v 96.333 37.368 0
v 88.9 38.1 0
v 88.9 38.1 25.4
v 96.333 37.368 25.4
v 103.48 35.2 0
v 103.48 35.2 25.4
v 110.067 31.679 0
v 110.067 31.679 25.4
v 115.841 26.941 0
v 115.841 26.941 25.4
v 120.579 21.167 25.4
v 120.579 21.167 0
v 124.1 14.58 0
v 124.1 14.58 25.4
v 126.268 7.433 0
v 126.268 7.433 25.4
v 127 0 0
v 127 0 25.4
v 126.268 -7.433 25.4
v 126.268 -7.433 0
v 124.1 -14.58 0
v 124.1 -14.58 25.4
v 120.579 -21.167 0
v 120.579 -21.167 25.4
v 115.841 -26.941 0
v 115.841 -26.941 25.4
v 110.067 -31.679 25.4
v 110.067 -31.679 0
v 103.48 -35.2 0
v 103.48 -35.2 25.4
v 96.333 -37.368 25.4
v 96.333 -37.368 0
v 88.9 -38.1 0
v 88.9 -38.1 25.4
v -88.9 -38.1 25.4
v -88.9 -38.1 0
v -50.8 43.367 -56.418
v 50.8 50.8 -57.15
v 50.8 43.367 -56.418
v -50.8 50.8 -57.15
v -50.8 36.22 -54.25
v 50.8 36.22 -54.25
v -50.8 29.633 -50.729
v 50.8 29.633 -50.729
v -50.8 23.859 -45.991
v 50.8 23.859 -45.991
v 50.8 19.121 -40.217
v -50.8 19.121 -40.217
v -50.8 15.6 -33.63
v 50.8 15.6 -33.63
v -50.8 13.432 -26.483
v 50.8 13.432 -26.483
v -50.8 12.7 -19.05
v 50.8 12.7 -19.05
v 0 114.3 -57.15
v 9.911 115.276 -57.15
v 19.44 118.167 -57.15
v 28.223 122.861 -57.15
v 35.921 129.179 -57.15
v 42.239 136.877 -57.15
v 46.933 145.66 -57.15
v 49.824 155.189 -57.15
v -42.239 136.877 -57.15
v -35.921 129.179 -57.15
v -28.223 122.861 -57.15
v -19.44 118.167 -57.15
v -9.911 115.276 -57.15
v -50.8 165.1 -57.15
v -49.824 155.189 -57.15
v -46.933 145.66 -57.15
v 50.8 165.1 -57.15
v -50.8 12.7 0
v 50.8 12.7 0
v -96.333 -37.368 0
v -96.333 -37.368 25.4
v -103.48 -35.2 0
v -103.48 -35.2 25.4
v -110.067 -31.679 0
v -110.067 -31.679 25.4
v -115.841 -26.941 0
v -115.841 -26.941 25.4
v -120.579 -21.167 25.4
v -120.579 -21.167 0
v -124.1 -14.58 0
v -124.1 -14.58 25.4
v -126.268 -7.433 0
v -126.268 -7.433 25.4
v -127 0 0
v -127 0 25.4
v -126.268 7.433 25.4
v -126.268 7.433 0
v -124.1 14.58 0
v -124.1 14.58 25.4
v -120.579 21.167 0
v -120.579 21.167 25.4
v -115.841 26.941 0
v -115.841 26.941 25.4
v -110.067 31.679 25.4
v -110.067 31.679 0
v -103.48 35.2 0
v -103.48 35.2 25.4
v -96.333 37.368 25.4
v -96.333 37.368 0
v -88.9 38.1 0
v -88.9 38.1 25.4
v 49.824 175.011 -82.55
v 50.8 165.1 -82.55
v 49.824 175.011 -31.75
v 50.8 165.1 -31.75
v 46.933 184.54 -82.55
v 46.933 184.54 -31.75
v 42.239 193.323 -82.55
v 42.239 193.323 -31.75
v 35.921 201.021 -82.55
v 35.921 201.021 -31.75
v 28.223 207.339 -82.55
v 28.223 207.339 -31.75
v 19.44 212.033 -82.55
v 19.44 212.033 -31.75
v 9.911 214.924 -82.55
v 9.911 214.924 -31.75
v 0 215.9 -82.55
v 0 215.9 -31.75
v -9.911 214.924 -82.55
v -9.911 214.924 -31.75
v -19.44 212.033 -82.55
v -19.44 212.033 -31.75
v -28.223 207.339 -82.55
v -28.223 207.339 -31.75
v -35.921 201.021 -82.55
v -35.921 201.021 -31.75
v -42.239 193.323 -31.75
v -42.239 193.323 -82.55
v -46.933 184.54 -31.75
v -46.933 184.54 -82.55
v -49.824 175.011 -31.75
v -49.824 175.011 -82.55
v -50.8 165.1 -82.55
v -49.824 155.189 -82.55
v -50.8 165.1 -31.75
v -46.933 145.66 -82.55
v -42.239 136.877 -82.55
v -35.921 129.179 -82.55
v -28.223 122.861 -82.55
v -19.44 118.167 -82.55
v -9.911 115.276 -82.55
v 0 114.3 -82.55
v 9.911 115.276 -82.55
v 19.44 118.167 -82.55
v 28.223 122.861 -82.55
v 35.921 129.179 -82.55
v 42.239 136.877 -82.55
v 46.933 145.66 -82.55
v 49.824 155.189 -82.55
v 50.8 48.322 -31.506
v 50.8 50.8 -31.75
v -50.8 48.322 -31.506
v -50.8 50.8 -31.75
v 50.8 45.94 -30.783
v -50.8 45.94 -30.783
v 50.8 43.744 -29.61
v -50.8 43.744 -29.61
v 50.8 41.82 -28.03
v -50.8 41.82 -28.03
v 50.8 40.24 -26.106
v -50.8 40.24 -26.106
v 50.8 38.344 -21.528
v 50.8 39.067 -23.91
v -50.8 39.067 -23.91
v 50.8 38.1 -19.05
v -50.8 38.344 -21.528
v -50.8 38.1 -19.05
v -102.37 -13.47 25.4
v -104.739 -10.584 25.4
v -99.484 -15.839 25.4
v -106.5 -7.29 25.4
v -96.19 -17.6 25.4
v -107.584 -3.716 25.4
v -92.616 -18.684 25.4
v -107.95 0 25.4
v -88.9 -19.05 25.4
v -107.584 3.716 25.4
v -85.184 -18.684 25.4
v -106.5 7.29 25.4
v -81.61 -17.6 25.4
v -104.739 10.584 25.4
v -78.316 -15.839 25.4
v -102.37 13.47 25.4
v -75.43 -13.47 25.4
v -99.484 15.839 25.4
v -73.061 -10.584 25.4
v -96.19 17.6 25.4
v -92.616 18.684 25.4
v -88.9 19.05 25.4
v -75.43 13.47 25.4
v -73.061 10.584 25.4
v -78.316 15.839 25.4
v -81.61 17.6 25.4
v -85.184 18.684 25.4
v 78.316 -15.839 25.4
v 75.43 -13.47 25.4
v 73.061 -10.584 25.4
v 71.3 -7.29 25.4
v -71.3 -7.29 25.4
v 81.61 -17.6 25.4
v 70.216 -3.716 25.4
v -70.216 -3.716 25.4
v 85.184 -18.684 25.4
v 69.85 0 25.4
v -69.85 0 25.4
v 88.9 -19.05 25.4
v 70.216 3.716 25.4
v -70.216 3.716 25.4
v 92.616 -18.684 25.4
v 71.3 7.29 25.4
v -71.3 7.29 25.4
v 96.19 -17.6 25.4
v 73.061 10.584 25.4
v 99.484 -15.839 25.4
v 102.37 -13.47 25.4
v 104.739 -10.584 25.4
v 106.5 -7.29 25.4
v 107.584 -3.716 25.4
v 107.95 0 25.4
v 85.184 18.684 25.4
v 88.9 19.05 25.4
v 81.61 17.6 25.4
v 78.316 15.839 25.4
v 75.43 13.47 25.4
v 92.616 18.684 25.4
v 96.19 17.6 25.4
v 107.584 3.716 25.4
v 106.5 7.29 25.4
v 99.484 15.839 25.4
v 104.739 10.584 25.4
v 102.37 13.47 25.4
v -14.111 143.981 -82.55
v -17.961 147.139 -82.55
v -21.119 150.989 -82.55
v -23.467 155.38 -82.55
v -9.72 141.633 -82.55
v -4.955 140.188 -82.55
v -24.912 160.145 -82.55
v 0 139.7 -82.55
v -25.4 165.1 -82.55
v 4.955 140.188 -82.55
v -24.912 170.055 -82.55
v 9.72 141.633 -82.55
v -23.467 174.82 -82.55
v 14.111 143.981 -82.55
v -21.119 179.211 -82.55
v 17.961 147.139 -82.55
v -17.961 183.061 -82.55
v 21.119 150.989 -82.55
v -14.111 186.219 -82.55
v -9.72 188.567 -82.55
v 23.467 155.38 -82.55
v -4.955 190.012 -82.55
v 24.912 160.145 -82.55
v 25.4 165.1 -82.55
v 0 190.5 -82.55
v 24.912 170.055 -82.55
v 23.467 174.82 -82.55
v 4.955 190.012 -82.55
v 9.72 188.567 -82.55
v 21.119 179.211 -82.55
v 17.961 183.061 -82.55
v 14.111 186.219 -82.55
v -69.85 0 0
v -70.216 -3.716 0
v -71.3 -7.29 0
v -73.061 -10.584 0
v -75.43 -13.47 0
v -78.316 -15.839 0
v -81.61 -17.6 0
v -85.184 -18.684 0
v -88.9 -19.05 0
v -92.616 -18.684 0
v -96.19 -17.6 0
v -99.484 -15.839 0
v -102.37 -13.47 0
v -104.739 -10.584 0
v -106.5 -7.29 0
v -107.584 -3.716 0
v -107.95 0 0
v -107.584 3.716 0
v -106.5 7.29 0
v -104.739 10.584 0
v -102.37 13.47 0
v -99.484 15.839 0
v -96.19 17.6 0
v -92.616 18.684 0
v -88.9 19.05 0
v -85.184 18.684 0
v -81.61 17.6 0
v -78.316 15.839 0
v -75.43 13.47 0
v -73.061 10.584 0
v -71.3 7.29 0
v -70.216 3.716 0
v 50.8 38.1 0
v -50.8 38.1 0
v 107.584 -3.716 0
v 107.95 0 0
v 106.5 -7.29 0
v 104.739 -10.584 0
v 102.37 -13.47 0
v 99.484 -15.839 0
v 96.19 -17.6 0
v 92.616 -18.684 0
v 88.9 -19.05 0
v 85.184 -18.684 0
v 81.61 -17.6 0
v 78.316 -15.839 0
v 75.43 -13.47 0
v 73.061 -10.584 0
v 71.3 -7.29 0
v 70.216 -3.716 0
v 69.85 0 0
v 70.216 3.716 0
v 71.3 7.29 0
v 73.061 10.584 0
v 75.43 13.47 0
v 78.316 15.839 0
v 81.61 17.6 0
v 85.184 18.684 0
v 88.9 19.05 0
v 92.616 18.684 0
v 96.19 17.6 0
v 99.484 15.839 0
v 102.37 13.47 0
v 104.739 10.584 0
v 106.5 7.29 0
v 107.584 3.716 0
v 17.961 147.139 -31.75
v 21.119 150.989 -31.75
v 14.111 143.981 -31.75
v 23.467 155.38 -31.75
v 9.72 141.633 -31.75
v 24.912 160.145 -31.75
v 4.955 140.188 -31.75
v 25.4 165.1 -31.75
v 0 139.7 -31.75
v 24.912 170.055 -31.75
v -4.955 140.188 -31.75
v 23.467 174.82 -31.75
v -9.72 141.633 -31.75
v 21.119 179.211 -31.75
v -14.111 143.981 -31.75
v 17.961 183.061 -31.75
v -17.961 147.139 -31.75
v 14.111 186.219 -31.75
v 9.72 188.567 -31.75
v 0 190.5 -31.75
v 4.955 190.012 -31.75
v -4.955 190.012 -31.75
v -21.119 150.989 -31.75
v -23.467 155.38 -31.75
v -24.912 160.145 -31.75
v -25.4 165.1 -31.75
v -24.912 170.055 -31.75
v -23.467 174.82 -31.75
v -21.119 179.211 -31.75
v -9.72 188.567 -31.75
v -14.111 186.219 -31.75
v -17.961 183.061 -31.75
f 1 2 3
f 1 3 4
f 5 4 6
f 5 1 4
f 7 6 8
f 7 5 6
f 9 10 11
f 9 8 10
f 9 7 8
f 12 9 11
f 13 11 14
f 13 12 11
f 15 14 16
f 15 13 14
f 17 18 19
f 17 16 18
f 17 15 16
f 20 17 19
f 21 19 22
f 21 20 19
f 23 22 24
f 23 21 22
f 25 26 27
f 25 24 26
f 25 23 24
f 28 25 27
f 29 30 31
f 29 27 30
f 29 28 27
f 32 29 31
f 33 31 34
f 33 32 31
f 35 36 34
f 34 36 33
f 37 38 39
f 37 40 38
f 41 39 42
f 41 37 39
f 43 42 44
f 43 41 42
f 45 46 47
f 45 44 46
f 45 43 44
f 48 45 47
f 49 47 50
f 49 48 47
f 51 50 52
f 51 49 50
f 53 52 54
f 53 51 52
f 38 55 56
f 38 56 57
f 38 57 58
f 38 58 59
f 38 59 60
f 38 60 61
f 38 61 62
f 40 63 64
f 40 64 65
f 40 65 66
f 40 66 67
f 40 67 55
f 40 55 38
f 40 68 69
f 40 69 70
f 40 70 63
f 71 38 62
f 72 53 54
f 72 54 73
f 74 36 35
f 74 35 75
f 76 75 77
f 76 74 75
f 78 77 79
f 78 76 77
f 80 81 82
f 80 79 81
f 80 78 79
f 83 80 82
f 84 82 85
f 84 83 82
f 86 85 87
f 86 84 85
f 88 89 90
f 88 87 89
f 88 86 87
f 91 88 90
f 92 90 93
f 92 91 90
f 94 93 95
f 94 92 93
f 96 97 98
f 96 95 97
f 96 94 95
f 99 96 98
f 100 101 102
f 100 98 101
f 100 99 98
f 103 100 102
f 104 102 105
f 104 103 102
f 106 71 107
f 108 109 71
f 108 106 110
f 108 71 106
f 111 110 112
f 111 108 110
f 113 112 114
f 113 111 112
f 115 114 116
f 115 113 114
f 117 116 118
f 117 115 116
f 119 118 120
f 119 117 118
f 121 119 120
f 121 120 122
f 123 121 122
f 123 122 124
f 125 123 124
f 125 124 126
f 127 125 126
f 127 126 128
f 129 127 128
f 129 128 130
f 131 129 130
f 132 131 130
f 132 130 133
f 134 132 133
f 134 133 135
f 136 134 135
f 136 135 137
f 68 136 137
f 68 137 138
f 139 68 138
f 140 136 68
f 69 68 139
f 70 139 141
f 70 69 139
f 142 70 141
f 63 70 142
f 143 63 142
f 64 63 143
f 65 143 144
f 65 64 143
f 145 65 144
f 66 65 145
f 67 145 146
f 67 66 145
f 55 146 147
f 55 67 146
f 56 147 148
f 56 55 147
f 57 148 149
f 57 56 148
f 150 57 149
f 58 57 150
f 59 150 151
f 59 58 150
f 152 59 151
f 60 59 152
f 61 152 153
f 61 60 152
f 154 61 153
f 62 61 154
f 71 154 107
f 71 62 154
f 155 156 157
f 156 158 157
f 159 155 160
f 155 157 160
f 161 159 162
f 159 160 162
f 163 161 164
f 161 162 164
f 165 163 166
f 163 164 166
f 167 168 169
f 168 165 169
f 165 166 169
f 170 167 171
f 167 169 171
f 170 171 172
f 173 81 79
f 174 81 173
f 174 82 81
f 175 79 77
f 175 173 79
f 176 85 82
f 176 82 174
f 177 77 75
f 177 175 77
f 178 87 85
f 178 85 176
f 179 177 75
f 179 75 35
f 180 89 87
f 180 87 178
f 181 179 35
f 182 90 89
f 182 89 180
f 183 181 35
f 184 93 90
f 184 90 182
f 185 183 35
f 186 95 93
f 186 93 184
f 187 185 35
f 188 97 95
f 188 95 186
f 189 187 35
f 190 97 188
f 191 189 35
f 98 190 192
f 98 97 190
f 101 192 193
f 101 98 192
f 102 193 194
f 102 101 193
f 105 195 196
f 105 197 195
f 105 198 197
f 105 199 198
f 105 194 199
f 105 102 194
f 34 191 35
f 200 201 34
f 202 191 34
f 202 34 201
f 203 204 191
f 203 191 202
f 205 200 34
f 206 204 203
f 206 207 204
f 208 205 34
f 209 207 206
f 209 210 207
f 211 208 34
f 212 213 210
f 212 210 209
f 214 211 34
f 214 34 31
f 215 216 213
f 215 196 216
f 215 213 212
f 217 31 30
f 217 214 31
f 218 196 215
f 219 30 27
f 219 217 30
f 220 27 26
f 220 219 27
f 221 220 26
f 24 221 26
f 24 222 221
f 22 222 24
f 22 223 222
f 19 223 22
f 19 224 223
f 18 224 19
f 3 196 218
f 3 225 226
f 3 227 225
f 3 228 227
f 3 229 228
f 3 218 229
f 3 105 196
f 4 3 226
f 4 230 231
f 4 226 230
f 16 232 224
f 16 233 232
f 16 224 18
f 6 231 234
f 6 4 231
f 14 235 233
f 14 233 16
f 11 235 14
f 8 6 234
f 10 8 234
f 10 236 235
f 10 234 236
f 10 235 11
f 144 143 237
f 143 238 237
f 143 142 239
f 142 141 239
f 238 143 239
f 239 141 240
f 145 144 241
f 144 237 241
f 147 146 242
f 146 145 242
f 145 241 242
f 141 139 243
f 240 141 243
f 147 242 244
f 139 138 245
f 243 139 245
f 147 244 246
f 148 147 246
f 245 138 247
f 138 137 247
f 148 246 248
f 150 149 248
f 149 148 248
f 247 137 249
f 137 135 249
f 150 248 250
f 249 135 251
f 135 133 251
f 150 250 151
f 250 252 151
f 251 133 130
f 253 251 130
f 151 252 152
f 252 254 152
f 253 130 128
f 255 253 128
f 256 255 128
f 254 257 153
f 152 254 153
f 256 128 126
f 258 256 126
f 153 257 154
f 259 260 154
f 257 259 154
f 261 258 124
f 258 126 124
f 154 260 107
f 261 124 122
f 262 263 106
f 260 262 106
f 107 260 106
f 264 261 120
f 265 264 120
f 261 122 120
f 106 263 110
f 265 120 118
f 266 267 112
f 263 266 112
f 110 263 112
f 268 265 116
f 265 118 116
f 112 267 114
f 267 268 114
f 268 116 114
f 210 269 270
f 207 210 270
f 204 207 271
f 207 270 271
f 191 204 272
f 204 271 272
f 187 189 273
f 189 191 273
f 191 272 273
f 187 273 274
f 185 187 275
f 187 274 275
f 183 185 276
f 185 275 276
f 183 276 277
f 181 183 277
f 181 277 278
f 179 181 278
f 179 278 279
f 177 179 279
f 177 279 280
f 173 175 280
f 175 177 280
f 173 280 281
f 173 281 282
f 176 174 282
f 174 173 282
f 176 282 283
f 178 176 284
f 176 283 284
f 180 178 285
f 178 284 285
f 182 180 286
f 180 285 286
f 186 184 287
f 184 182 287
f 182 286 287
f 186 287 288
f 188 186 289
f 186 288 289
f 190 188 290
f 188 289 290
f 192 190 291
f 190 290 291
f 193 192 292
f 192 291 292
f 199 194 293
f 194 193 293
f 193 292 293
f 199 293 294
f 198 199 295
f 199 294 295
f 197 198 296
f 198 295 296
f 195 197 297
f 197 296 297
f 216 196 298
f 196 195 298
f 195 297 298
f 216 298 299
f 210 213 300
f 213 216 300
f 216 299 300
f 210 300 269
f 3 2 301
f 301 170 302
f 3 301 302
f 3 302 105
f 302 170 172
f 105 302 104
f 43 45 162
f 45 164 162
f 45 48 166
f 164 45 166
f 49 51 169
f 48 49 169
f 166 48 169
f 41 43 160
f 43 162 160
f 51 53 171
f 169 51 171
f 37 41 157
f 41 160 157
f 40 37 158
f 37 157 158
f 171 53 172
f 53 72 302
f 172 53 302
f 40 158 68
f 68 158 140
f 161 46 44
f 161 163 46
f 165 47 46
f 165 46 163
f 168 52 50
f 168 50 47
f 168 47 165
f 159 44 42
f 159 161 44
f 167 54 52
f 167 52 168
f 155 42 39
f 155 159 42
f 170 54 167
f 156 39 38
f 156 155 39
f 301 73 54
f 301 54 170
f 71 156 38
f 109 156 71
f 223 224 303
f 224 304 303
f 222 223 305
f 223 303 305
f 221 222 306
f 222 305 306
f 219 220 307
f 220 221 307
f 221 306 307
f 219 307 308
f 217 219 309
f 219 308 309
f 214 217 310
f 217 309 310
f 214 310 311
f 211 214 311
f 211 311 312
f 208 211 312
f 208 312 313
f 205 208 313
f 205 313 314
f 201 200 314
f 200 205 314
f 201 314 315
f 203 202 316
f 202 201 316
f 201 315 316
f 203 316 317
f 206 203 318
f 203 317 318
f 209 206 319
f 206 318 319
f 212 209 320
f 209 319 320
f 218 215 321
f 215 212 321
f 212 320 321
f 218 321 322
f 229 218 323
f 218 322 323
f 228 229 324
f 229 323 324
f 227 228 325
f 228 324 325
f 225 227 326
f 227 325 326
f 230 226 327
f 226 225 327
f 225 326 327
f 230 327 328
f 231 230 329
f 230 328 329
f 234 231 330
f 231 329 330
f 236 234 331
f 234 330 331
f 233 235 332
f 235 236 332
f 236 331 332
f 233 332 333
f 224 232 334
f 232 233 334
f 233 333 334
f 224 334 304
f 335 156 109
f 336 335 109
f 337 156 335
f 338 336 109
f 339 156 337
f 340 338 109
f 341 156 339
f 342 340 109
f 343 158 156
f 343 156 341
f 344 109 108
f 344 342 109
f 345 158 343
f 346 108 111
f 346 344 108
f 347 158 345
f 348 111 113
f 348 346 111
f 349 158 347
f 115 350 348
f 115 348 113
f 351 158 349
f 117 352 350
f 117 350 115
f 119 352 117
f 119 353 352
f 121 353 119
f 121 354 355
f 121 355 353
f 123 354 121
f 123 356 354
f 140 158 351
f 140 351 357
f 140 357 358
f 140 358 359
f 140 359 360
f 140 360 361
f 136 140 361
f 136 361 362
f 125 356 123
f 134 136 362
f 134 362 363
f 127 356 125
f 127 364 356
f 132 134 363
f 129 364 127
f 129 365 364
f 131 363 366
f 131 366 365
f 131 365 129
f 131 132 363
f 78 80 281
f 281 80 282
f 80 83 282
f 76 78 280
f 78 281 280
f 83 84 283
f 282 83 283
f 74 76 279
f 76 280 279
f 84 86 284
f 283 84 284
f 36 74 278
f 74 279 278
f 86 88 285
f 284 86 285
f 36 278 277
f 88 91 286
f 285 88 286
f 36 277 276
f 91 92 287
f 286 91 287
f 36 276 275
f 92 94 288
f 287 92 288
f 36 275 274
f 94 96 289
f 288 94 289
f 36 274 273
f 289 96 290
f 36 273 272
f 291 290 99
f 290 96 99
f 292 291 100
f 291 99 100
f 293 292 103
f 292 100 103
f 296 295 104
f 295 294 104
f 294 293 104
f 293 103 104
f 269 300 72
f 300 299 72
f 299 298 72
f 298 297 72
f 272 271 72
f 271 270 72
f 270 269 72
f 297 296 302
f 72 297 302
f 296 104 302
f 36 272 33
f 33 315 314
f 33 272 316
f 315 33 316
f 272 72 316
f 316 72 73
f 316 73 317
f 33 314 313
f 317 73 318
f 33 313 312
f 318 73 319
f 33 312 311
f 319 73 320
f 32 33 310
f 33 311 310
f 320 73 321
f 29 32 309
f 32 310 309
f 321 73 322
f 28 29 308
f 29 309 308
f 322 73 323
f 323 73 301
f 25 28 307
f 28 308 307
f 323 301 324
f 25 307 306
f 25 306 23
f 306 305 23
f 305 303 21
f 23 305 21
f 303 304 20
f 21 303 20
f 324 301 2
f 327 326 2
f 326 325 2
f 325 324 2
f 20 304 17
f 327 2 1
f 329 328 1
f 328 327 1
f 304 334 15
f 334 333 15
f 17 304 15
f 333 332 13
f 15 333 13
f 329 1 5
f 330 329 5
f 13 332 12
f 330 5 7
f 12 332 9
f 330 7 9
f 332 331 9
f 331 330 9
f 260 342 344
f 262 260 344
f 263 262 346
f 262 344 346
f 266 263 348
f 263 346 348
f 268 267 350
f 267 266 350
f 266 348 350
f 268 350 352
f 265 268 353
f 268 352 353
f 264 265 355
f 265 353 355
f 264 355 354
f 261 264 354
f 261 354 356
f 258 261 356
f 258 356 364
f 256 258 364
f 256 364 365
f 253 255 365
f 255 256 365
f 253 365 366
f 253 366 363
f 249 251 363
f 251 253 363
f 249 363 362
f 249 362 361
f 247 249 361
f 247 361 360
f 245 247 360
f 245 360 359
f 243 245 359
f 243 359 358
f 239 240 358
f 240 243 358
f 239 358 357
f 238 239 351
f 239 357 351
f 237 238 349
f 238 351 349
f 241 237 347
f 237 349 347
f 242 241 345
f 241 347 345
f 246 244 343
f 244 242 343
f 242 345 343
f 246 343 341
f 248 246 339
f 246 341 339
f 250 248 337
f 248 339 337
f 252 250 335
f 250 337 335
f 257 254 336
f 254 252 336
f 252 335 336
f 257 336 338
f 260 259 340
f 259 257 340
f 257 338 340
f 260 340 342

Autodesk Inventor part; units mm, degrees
ref_plane "YZ Plane" through (0, 0, 0) normal (1, 0, 0) x (0, 1, 0)
ref_plane "XZ Plane" through (0, 0, 0) normal (0, 1, 0) x (-1, 0, 0)
ref_plane "XY Plane" through (0, 0, 0) normal (0, 0, 1) x (1, 0, 0)
sketch "SLOT SK" plane through (0, 0, 0) normal (0, 0, 1) x (1, 0, 0)
  line L0 (-88.9, 0) -> (88.9, 0) construction
  line L1 (-88.9, -38.1) -> (88.9, -38.1)
  line L2 (88.9, 38.1) -> (-88.9, 38.1)
  arc A0 (-88.9, 38.1) -> (-88.9, -38.1) centre (-88.9, 0) ccw
  arc A1 (88.9, -38.1) -> (88.9, 38.1) centre (88.9, 0) ccw
  circle A2 centre (-88.9, 0) radius 19.05
  circle A3 centre (88.9, 0) radius 19.05
  point P0 (0, 0)
  point P1 (0, 0)
  dimension "d0" = 177.8
  dimension "d1" = 88.9
  dimension "d2" = 38.1
  dimension "d3" = 38.1
  dimension "d4" = 38.1
extrude "SLOT EXT" add sketch "SLOT SK" along normal blind 25.4
sketch "Sketch2" plane through (0, 0, 0) normal (1, 0, 0) x (0, 1, 0)
  line L0 (38.1, 0) -> (-38.1, 0) projected
  line L1 (12.7, 0) -> (38.1, 0)
  line L2 (38.1, 0) -> (38.1, -19.05)
  line L3 (50.8, -31.75) -> (165.1, -31.75)
  line L4 (165.1, -31.75) -> (165.1, -57.15)
  line L5 (165.1, -57.15) -> (50.8, -57.15)
  line L6 (12.7, -19.05) -> (12.7, 0)
  arc A0 (38.1, -19.05) -> (50.8, -31.75) centre (50.8, -19.05) ccw
  arc A1 (12.7, -19.05) -> (50.8, -57.15) centre (50.8, -19.05) ccw
  line L7 (38.1, 0) -> (38.1, 25.4) projected
  line L8 (38.1, 25.4) -> (-38.1, 25.4) projected
  point P0 (0, 0)
  dimension "d7" = 12.7
  dimension "d8" = 38.1
  dimension "d9" = 127
  dimension "d10" = 57.15
  dimension "d11" = 25.4
  dimension "d12" = 25.4
extrude "J JOINT" add sketch "Sketch2" along normal mid plane 101.6
sketch "TOP JOINT" plane through (-50.8, 50.8, -31.75) normal (0, 0, 1) x (1, 0, 0)
  line L0 (0, 114.3) -> (101.6, 114.3) projected
  line L1 (101.6, 0) -> (101.6, 114.3) projected
  circle A0 centre (50.8, 114.3) radius 50.8
  circle A1 centre (50.8, 114.3) radius 25.4
  point P0 (50.8, -50.8)
  point P1 (76.2, 114.3)
  point P2 (25.4, 114.3)
  dimension "d15" = 50.8
extrude "TOP CYLINDER" add sketch "TOP JOINT" against normal blind 50.8 contours A1 L0 A0 | L0 A0 A1
extrude "TOP HOLE" cut sketch "TOP JOINT" against normal blind 101.6 contours A1 L0 picked at (54.5078, 94.9925)
equation "\"d1\" = 0.5 * d0"
equation "\"d4\" = d3"
properties part number "ASN5-6-BK" material "Thermoplastic Resin"
